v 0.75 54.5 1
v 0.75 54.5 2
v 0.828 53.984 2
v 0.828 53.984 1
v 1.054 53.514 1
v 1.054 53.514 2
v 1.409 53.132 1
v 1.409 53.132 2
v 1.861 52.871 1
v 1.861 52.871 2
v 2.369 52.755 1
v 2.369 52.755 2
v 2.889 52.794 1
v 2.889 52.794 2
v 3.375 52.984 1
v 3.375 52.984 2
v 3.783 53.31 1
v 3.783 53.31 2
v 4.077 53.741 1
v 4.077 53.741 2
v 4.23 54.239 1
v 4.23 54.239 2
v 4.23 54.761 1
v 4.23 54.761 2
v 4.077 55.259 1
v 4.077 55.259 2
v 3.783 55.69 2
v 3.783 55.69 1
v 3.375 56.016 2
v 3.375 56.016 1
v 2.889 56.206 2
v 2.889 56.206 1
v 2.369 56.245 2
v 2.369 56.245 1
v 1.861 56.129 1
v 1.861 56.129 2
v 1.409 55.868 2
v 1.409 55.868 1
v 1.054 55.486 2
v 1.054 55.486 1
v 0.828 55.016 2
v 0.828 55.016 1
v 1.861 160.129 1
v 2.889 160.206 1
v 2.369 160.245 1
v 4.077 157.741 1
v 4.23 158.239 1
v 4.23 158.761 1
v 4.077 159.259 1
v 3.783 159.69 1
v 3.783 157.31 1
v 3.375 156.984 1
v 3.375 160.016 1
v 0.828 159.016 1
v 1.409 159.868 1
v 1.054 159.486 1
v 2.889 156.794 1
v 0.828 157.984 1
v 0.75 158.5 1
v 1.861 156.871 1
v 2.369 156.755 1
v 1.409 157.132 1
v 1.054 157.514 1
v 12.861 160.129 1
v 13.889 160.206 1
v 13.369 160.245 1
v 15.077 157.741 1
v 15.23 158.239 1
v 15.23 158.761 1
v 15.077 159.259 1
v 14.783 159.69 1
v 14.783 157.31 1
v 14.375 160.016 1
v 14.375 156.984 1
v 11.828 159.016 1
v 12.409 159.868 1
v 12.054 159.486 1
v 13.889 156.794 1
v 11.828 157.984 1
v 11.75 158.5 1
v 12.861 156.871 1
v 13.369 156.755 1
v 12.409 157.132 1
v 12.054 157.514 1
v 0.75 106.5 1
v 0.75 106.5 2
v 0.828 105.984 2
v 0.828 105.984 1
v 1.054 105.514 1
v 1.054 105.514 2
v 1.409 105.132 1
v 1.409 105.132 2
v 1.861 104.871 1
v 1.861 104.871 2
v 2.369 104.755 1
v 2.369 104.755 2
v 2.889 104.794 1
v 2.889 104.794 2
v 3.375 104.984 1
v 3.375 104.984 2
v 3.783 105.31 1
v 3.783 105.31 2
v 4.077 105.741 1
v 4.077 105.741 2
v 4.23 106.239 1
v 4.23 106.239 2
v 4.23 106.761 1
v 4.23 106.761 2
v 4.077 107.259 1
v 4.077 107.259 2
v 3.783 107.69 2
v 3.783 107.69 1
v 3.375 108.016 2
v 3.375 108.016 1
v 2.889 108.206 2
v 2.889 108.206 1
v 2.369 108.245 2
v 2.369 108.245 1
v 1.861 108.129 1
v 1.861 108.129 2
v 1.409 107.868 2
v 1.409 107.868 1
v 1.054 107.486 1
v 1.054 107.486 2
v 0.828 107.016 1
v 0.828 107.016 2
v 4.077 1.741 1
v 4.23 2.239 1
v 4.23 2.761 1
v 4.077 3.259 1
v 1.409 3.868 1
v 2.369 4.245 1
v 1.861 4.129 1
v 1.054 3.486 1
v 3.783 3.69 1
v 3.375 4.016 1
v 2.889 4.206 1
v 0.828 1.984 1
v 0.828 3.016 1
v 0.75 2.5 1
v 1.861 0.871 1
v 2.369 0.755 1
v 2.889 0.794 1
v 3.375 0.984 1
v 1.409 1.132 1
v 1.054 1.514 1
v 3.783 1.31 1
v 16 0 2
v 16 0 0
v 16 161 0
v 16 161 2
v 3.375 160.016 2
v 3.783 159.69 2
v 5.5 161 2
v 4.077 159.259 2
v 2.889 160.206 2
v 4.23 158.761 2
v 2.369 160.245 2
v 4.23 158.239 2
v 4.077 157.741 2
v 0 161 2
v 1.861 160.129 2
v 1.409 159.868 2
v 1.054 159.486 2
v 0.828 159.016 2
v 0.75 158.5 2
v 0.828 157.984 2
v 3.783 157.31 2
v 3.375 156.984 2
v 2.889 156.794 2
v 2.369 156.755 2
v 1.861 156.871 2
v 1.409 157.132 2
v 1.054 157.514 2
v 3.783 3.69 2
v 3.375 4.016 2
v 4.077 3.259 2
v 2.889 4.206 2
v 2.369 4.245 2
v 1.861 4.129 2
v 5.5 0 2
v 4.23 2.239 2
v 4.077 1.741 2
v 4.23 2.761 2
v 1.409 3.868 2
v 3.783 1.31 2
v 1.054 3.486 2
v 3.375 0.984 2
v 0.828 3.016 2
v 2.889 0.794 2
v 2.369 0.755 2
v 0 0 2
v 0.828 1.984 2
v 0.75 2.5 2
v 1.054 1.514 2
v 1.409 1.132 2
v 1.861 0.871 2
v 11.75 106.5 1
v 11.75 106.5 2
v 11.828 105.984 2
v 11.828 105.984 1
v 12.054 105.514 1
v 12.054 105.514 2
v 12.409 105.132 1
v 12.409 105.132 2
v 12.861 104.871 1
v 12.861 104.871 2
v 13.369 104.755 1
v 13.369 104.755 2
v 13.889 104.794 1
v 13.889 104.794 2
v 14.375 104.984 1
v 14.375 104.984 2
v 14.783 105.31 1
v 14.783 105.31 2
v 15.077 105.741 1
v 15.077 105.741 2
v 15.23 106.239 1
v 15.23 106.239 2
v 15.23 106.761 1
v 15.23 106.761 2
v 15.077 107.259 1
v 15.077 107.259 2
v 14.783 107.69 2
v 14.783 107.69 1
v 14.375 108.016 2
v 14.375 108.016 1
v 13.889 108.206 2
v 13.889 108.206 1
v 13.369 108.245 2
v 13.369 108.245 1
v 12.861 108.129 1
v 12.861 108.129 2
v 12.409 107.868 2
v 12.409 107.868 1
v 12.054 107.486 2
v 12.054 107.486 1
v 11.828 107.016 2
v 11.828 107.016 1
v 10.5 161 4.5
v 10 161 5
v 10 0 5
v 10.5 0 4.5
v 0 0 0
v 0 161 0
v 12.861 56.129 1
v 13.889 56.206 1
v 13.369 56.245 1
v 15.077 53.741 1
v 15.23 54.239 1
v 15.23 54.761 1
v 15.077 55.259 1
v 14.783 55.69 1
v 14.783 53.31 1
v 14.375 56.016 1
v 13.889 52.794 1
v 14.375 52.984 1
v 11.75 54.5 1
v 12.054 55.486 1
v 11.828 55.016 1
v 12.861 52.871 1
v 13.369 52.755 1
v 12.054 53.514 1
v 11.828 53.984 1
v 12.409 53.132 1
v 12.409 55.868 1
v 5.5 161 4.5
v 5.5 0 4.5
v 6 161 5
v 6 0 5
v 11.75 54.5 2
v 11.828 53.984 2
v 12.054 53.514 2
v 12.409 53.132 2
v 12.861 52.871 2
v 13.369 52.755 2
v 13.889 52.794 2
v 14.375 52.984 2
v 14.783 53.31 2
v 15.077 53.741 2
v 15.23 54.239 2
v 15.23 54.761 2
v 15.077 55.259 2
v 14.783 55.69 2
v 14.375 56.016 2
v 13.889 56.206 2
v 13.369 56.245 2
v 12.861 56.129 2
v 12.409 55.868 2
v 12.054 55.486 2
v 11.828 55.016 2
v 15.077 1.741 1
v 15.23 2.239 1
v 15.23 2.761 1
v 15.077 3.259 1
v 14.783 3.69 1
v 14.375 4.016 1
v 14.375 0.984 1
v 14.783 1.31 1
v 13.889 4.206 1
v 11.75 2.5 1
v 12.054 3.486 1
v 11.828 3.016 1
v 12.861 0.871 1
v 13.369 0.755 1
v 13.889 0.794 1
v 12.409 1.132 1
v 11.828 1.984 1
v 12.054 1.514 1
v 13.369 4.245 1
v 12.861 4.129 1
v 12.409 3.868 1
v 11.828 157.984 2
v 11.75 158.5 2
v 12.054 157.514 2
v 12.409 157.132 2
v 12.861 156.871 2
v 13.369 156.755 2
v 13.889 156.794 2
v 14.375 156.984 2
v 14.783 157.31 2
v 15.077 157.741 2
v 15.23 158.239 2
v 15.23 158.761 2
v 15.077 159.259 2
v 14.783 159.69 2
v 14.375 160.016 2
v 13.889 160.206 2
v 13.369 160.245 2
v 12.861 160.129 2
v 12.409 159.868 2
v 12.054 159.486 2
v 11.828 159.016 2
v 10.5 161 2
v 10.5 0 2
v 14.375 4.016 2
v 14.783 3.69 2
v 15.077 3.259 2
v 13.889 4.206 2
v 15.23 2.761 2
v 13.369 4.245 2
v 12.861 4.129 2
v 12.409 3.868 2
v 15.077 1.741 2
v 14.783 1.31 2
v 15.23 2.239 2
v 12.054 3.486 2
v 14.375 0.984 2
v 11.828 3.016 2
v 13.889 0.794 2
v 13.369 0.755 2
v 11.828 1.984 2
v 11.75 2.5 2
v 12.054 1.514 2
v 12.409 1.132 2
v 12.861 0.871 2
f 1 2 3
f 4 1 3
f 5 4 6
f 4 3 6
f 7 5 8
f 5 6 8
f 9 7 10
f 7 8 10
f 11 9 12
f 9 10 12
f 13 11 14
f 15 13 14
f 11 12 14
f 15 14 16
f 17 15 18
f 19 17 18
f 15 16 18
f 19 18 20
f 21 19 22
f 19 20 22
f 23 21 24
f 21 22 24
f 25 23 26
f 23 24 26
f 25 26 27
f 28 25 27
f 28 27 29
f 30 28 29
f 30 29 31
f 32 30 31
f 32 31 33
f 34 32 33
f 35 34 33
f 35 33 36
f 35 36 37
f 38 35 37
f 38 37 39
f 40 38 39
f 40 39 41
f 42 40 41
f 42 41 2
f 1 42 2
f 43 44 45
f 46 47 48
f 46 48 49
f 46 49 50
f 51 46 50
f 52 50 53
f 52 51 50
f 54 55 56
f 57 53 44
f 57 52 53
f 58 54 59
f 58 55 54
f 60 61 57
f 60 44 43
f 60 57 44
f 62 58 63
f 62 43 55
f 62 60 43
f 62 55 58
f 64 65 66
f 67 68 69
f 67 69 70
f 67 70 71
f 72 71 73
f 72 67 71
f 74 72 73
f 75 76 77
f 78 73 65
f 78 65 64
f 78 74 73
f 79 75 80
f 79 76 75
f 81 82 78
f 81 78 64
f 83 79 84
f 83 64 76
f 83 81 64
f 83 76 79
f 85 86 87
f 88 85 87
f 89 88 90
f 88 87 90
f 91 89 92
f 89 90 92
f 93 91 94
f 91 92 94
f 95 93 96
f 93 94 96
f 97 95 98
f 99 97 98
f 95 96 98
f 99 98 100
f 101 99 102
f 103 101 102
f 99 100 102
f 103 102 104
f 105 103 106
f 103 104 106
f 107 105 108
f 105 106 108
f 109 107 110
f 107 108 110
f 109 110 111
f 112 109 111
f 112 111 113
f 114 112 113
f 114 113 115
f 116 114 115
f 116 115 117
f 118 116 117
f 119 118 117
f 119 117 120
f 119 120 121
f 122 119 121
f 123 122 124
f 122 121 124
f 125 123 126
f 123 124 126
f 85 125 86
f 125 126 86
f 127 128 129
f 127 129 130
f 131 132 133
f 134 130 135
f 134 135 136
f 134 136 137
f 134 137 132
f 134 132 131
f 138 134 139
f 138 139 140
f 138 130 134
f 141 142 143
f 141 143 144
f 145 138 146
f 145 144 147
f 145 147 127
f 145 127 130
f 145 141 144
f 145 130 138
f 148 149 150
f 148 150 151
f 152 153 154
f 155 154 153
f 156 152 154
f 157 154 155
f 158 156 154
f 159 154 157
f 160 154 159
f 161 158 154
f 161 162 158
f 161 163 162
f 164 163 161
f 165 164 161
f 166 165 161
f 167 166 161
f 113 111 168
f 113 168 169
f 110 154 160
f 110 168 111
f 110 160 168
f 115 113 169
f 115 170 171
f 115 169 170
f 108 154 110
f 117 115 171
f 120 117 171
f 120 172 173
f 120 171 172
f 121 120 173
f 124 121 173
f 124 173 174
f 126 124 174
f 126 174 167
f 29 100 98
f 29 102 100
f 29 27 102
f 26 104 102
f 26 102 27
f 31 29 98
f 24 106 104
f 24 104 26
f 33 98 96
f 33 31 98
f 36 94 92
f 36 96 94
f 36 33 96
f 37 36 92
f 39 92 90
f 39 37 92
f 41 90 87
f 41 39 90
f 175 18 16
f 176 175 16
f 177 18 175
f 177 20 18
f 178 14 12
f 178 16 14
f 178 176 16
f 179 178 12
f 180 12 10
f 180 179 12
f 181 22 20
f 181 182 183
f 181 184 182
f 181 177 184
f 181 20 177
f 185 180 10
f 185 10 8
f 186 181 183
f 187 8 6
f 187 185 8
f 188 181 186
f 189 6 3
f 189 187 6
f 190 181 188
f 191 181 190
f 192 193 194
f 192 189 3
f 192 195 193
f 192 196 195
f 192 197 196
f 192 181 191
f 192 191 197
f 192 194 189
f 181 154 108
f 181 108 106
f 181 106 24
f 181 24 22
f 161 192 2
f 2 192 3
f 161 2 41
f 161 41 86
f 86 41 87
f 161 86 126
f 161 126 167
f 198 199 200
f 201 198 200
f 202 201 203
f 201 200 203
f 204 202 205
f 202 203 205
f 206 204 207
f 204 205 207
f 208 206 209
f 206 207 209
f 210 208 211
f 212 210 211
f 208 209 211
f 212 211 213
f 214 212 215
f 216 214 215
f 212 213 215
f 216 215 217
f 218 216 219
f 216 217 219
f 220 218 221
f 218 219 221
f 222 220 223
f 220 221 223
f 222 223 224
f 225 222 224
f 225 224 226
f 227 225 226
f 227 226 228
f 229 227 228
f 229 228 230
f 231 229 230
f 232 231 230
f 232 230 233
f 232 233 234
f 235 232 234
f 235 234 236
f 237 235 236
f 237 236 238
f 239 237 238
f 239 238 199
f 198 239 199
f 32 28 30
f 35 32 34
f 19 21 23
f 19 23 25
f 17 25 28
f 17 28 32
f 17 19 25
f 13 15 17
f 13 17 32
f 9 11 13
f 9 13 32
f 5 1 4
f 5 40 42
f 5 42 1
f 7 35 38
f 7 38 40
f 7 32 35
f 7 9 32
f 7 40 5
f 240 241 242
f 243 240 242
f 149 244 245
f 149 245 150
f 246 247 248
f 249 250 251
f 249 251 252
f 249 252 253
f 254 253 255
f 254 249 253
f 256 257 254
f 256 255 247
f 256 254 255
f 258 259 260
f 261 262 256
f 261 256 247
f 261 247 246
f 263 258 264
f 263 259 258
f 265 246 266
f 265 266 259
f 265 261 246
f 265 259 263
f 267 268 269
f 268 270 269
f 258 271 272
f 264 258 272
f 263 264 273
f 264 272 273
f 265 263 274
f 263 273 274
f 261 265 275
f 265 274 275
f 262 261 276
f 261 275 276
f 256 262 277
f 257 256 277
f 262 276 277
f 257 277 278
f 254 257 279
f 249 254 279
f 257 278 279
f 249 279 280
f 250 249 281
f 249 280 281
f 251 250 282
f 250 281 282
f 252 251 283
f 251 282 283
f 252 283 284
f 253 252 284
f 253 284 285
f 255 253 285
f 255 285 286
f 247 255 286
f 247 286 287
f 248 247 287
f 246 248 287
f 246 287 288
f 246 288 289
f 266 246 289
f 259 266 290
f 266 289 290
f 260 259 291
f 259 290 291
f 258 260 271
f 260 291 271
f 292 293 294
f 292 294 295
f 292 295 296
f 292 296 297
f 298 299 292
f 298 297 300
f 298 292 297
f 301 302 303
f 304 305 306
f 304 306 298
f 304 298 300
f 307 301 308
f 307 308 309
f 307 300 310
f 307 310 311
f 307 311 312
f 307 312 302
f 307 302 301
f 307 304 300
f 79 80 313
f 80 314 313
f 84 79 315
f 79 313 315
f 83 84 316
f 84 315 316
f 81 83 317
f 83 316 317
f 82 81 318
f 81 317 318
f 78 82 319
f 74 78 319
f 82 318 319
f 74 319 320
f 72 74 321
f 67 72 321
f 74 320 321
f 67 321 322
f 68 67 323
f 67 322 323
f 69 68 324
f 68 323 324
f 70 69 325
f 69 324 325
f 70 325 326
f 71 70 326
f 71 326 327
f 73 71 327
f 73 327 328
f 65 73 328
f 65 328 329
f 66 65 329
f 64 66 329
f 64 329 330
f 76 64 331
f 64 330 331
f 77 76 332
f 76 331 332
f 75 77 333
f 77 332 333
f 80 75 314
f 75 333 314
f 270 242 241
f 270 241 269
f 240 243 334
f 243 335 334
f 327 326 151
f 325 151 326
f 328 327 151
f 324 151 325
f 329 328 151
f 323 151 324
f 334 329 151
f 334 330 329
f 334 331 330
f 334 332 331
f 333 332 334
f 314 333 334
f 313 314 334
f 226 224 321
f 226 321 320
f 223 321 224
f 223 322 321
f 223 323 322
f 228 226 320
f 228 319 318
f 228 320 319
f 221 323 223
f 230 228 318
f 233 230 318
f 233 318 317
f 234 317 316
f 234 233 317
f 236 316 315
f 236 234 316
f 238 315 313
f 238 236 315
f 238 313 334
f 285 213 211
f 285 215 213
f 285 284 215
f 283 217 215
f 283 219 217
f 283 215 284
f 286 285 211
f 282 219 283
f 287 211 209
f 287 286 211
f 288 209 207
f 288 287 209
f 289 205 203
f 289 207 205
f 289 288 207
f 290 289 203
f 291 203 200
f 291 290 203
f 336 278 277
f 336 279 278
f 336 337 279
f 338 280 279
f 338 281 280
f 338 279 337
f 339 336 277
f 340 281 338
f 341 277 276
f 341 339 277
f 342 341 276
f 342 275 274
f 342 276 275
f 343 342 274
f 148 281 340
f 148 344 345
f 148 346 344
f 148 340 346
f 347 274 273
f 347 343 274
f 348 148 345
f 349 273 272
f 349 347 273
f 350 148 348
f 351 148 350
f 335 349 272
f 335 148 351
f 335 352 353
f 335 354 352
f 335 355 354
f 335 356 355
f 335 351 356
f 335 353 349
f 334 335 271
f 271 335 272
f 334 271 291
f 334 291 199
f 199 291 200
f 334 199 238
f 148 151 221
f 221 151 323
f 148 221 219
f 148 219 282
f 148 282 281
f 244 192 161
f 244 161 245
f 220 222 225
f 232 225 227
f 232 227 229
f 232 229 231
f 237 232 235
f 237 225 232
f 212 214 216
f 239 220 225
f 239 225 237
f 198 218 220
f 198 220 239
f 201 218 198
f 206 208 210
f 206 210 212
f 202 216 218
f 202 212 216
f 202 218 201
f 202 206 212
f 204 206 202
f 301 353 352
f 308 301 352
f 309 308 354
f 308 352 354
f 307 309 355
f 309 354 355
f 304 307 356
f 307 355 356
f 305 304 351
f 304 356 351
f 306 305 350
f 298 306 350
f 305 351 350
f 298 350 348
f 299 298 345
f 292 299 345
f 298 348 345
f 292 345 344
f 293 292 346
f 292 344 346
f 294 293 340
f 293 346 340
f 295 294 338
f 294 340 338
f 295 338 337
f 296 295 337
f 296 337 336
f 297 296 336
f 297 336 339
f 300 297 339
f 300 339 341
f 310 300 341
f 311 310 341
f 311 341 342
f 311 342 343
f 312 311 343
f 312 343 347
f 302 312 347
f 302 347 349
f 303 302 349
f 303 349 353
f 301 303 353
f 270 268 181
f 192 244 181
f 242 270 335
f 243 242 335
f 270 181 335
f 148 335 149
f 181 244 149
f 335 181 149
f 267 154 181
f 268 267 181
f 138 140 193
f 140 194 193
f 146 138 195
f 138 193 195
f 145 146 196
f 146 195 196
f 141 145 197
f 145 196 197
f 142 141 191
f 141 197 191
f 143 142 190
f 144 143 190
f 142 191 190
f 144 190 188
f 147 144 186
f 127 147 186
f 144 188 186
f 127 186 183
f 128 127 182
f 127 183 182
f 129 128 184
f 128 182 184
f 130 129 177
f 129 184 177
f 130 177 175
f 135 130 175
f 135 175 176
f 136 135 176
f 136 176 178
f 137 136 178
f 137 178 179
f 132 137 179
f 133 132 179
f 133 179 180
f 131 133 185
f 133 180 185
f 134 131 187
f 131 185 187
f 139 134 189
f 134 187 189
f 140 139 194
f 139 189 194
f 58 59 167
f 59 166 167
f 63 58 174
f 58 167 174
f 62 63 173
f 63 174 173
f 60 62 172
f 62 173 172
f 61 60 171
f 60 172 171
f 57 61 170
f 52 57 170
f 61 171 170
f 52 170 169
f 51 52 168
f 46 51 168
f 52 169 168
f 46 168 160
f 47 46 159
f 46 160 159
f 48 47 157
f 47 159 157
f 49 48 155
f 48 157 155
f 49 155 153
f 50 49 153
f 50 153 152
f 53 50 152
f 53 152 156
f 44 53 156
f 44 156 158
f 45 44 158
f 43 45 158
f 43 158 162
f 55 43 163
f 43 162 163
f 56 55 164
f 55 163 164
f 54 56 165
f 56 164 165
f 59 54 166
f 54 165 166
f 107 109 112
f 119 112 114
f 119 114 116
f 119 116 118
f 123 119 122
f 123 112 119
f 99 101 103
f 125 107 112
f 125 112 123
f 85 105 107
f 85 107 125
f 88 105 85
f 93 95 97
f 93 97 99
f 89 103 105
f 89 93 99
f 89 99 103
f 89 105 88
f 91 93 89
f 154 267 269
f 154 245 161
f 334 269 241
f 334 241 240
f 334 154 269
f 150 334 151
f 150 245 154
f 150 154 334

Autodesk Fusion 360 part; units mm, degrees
sketch "3D-printed conduit top outline" plane through (0, 0, 0) normal (0, 1, 0) x (1, 0, 0)
  line L0 (0, 0) -> (16, 0)
  line L1 (16, 0) -> (16, -2)
  line L2 (16, -2) -> (0, -2)
  line L3 (0, -2) -> (0, 0)
  dimension "d7" = 16
  dimension "d8" = 2
extrude "Extrude1" add sketch "3D-printed conduit top outline" along normal blind 161
sketch "Magnet holes" plane through (0, 0, 2) normal (0, 0, 1) x (-1, 0, 0)
  line L0 (0, 0) -> (-16, 0)
  line L1 (-16, 0) -> (-16, -161)
  line L2 (-16, -161) -> (0, -161)
  line L3 (0, -161) -> (0, 0)
  circle A0 centre (-2.5, -2.5) radius 2.5
  circle A1 centre (-13.5, -2.5) radius 2.5
  circle A2 centre (-2.5, -2.5) radius 1.75
  circle A3 centre (-13.5, -2.5) radius 1.75
  circle A4 centre (-2.5, -54.5) radius 1.75
  circle A5 centre (-2.5, -54.5) radius 2.5
  circle A6 centre (-13.5, -54.5) radius 2.5
  circle A7 centre (-13.5, -54.5) radius 1.75
  circle A8 centre (-2.5, -106.5) radius 1.75
  circle A9 centre (-2.5, -106.5) radius 2.5
  circle A10 centre (-13.5, -106.5) radius 2.5
  circle A11 centre (-13.5, -106.5) radius 1.75
  circle A12 centre (-2.5, -158.5) radius 1.75
  circle A13 centre (-2.5, -158.5) radius 2.5
  circle A14 centre (-13.5, -158.5) radius 2.5
  circle A15 centre (-13.5, -158.5) radius 1.75
  dimension "d11" = 5
  dimension "d12" = 5
  dimension "d13" = 3.5
  dimension "d14" = 3.5
  dimension "d17" = 0
  dimension "d18" = -156
extrude "Extrude2" cut sketch "Magnet holes" against normal blind 1 contours A2 | A3 | A4 | A7 | A8 | A11 | A12 | A15
sketch "Support rib" plane through (0, 0, 2) normal (0, 0, 1) x (-1, 0, 0)
  line L0 (0, 0) -> (-16, 0)
  line L1 (-16, 0) -> (-16, -161)
  line L2 (-16, -161) -> (0, -161)
  line L3 (0, -161) -> (0, 0)
  circle A0 centre (-13.5, -158.5) radius 1.75
  circle A1 centre (-13.5, -54.5) radius 1.75
  circle A2 centre (-2.5, -2.5) radius 1.75
  circle A3 centre (-2.5, -106.5) radius 1.75
  circle A4 centre (-2.5, -158.5) radius 1.75
  circle A5 centre (-2.5, -54.5) radius 1.75
  circle A6 centre (-13.5, -2.5) radius 1.75
  circle A7 centre (-13.5, -106.5) radius 1.75
  line L4 (-5.5, 0) -> (-10.5, 0)
  line L5 (-10.5, 0) -> (-10.5, -161)
  line L6 (-10.5, -161) -> (-5.5, -161)
  line L7 (-5.5, -161) -> (-5.5, 0)
  dimension "d23" = 5
  dimension "d24" = 5.5
  dimension "d25" = 5.5
extrude "Extrude3" add sketch "Support rib" along normal blind 3 contours L0 L2 L4 L5 L6 L7
chamfer "Chamfer1" distance 0.5 angle 45 2 edges at (5.5, 80.5, 5) (10.5, 80.5, 5)
equation "conduit_length = 161 mm"
equation "conduit_width = 16 mm"
equation "conduit_wall_thickness = 2 mm"
equation "magnet_diameter = 3 mm"
equation "magnet_height = 1 mm"
equation "number_of_magnets_on_a_side = 4"
equation "d7 = conduit_width"
equation "d8 = conduit_wall_thickness"
equation "d9 = conduit_length"
equation "d11 = magnet_diameter + 2 mm"
equation "d12 = magnet_diameter + 2 mm"
equation "d13 = magnet_diameter + 0.5 mm"
equation "d14 = magnet_diameter + 0.5 mm"
equation "d16 = number_of_magnets_on_a_side"
equation "d18 = -conduit_length + magnet_diameter + 2 mm"
equation "d19 = -magnet_height"
equation "rib_width = 5 mm"
equation "rib_height = 3 mm"
equation "d23 = rib_width"
equation "d24 = ( conduit_width - rib_width ) / 2"
equation "d26 = rib_height"
equation "rib_chamfer = 0.5 mm"
equation "d29 = rib_chamfer"
